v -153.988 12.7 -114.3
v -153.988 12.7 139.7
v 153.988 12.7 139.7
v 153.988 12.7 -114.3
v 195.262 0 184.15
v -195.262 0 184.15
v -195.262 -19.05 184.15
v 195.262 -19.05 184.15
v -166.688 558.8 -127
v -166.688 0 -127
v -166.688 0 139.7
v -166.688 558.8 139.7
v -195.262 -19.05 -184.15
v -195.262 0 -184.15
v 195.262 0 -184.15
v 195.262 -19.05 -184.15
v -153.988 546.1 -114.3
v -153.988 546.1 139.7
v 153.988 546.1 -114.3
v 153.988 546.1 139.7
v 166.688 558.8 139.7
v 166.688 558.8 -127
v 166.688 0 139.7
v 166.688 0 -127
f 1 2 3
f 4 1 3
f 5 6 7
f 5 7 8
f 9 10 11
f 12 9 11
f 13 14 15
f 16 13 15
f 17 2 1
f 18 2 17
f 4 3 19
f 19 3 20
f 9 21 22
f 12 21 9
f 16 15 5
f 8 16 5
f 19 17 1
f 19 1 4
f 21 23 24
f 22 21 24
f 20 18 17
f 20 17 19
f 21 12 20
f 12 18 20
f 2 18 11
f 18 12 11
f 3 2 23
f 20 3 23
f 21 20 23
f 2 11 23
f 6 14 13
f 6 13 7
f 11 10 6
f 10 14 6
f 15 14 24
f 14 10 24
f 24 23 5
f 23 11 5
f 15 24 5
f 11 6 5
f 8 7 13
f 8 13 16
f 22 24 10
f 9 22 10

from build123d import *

# Parameters (mm, degrees)
F0_W     = 390.525
F0_H     = 368.3
F1_DEPTH = 19.05
F3_DEPTH = 558.8
F4_W     = 307.975
F4_H     = 533.4
F5_DEPTH = 254


with BuildPart() as f1:
    # F0 (on Front) → F1 (new body)
    with BuildSketch(Plane.XZ):
        Rectangle(F0_W, F0_H)
    extrude(amount=F1_DEPTH)

    # F2 (on face) → F3 (join)
    with BuildSketch(Plane(origin=(0, 0, 0), x_dir=(-1, 0, 0), z_dir=(0, 1, 0))):
        Polygon((-166.6875, -127), (0, -127), (166.6875, -127), (166.6875, 139.7), (-166.6875, 139.7), align=None)
    extrude(amount=F3_DEPTH)

    # F4 (on face) → F5 (cut)
    with BuildSketch(Plane.XY.offset(139.7)):
        with Locations((0, 279.4)):
            Rectangle(F4_W, F4_H)
    extrude(amount=-F5_DEPTH, mode=Mode.SUBTRACT)


solid = f1.part
